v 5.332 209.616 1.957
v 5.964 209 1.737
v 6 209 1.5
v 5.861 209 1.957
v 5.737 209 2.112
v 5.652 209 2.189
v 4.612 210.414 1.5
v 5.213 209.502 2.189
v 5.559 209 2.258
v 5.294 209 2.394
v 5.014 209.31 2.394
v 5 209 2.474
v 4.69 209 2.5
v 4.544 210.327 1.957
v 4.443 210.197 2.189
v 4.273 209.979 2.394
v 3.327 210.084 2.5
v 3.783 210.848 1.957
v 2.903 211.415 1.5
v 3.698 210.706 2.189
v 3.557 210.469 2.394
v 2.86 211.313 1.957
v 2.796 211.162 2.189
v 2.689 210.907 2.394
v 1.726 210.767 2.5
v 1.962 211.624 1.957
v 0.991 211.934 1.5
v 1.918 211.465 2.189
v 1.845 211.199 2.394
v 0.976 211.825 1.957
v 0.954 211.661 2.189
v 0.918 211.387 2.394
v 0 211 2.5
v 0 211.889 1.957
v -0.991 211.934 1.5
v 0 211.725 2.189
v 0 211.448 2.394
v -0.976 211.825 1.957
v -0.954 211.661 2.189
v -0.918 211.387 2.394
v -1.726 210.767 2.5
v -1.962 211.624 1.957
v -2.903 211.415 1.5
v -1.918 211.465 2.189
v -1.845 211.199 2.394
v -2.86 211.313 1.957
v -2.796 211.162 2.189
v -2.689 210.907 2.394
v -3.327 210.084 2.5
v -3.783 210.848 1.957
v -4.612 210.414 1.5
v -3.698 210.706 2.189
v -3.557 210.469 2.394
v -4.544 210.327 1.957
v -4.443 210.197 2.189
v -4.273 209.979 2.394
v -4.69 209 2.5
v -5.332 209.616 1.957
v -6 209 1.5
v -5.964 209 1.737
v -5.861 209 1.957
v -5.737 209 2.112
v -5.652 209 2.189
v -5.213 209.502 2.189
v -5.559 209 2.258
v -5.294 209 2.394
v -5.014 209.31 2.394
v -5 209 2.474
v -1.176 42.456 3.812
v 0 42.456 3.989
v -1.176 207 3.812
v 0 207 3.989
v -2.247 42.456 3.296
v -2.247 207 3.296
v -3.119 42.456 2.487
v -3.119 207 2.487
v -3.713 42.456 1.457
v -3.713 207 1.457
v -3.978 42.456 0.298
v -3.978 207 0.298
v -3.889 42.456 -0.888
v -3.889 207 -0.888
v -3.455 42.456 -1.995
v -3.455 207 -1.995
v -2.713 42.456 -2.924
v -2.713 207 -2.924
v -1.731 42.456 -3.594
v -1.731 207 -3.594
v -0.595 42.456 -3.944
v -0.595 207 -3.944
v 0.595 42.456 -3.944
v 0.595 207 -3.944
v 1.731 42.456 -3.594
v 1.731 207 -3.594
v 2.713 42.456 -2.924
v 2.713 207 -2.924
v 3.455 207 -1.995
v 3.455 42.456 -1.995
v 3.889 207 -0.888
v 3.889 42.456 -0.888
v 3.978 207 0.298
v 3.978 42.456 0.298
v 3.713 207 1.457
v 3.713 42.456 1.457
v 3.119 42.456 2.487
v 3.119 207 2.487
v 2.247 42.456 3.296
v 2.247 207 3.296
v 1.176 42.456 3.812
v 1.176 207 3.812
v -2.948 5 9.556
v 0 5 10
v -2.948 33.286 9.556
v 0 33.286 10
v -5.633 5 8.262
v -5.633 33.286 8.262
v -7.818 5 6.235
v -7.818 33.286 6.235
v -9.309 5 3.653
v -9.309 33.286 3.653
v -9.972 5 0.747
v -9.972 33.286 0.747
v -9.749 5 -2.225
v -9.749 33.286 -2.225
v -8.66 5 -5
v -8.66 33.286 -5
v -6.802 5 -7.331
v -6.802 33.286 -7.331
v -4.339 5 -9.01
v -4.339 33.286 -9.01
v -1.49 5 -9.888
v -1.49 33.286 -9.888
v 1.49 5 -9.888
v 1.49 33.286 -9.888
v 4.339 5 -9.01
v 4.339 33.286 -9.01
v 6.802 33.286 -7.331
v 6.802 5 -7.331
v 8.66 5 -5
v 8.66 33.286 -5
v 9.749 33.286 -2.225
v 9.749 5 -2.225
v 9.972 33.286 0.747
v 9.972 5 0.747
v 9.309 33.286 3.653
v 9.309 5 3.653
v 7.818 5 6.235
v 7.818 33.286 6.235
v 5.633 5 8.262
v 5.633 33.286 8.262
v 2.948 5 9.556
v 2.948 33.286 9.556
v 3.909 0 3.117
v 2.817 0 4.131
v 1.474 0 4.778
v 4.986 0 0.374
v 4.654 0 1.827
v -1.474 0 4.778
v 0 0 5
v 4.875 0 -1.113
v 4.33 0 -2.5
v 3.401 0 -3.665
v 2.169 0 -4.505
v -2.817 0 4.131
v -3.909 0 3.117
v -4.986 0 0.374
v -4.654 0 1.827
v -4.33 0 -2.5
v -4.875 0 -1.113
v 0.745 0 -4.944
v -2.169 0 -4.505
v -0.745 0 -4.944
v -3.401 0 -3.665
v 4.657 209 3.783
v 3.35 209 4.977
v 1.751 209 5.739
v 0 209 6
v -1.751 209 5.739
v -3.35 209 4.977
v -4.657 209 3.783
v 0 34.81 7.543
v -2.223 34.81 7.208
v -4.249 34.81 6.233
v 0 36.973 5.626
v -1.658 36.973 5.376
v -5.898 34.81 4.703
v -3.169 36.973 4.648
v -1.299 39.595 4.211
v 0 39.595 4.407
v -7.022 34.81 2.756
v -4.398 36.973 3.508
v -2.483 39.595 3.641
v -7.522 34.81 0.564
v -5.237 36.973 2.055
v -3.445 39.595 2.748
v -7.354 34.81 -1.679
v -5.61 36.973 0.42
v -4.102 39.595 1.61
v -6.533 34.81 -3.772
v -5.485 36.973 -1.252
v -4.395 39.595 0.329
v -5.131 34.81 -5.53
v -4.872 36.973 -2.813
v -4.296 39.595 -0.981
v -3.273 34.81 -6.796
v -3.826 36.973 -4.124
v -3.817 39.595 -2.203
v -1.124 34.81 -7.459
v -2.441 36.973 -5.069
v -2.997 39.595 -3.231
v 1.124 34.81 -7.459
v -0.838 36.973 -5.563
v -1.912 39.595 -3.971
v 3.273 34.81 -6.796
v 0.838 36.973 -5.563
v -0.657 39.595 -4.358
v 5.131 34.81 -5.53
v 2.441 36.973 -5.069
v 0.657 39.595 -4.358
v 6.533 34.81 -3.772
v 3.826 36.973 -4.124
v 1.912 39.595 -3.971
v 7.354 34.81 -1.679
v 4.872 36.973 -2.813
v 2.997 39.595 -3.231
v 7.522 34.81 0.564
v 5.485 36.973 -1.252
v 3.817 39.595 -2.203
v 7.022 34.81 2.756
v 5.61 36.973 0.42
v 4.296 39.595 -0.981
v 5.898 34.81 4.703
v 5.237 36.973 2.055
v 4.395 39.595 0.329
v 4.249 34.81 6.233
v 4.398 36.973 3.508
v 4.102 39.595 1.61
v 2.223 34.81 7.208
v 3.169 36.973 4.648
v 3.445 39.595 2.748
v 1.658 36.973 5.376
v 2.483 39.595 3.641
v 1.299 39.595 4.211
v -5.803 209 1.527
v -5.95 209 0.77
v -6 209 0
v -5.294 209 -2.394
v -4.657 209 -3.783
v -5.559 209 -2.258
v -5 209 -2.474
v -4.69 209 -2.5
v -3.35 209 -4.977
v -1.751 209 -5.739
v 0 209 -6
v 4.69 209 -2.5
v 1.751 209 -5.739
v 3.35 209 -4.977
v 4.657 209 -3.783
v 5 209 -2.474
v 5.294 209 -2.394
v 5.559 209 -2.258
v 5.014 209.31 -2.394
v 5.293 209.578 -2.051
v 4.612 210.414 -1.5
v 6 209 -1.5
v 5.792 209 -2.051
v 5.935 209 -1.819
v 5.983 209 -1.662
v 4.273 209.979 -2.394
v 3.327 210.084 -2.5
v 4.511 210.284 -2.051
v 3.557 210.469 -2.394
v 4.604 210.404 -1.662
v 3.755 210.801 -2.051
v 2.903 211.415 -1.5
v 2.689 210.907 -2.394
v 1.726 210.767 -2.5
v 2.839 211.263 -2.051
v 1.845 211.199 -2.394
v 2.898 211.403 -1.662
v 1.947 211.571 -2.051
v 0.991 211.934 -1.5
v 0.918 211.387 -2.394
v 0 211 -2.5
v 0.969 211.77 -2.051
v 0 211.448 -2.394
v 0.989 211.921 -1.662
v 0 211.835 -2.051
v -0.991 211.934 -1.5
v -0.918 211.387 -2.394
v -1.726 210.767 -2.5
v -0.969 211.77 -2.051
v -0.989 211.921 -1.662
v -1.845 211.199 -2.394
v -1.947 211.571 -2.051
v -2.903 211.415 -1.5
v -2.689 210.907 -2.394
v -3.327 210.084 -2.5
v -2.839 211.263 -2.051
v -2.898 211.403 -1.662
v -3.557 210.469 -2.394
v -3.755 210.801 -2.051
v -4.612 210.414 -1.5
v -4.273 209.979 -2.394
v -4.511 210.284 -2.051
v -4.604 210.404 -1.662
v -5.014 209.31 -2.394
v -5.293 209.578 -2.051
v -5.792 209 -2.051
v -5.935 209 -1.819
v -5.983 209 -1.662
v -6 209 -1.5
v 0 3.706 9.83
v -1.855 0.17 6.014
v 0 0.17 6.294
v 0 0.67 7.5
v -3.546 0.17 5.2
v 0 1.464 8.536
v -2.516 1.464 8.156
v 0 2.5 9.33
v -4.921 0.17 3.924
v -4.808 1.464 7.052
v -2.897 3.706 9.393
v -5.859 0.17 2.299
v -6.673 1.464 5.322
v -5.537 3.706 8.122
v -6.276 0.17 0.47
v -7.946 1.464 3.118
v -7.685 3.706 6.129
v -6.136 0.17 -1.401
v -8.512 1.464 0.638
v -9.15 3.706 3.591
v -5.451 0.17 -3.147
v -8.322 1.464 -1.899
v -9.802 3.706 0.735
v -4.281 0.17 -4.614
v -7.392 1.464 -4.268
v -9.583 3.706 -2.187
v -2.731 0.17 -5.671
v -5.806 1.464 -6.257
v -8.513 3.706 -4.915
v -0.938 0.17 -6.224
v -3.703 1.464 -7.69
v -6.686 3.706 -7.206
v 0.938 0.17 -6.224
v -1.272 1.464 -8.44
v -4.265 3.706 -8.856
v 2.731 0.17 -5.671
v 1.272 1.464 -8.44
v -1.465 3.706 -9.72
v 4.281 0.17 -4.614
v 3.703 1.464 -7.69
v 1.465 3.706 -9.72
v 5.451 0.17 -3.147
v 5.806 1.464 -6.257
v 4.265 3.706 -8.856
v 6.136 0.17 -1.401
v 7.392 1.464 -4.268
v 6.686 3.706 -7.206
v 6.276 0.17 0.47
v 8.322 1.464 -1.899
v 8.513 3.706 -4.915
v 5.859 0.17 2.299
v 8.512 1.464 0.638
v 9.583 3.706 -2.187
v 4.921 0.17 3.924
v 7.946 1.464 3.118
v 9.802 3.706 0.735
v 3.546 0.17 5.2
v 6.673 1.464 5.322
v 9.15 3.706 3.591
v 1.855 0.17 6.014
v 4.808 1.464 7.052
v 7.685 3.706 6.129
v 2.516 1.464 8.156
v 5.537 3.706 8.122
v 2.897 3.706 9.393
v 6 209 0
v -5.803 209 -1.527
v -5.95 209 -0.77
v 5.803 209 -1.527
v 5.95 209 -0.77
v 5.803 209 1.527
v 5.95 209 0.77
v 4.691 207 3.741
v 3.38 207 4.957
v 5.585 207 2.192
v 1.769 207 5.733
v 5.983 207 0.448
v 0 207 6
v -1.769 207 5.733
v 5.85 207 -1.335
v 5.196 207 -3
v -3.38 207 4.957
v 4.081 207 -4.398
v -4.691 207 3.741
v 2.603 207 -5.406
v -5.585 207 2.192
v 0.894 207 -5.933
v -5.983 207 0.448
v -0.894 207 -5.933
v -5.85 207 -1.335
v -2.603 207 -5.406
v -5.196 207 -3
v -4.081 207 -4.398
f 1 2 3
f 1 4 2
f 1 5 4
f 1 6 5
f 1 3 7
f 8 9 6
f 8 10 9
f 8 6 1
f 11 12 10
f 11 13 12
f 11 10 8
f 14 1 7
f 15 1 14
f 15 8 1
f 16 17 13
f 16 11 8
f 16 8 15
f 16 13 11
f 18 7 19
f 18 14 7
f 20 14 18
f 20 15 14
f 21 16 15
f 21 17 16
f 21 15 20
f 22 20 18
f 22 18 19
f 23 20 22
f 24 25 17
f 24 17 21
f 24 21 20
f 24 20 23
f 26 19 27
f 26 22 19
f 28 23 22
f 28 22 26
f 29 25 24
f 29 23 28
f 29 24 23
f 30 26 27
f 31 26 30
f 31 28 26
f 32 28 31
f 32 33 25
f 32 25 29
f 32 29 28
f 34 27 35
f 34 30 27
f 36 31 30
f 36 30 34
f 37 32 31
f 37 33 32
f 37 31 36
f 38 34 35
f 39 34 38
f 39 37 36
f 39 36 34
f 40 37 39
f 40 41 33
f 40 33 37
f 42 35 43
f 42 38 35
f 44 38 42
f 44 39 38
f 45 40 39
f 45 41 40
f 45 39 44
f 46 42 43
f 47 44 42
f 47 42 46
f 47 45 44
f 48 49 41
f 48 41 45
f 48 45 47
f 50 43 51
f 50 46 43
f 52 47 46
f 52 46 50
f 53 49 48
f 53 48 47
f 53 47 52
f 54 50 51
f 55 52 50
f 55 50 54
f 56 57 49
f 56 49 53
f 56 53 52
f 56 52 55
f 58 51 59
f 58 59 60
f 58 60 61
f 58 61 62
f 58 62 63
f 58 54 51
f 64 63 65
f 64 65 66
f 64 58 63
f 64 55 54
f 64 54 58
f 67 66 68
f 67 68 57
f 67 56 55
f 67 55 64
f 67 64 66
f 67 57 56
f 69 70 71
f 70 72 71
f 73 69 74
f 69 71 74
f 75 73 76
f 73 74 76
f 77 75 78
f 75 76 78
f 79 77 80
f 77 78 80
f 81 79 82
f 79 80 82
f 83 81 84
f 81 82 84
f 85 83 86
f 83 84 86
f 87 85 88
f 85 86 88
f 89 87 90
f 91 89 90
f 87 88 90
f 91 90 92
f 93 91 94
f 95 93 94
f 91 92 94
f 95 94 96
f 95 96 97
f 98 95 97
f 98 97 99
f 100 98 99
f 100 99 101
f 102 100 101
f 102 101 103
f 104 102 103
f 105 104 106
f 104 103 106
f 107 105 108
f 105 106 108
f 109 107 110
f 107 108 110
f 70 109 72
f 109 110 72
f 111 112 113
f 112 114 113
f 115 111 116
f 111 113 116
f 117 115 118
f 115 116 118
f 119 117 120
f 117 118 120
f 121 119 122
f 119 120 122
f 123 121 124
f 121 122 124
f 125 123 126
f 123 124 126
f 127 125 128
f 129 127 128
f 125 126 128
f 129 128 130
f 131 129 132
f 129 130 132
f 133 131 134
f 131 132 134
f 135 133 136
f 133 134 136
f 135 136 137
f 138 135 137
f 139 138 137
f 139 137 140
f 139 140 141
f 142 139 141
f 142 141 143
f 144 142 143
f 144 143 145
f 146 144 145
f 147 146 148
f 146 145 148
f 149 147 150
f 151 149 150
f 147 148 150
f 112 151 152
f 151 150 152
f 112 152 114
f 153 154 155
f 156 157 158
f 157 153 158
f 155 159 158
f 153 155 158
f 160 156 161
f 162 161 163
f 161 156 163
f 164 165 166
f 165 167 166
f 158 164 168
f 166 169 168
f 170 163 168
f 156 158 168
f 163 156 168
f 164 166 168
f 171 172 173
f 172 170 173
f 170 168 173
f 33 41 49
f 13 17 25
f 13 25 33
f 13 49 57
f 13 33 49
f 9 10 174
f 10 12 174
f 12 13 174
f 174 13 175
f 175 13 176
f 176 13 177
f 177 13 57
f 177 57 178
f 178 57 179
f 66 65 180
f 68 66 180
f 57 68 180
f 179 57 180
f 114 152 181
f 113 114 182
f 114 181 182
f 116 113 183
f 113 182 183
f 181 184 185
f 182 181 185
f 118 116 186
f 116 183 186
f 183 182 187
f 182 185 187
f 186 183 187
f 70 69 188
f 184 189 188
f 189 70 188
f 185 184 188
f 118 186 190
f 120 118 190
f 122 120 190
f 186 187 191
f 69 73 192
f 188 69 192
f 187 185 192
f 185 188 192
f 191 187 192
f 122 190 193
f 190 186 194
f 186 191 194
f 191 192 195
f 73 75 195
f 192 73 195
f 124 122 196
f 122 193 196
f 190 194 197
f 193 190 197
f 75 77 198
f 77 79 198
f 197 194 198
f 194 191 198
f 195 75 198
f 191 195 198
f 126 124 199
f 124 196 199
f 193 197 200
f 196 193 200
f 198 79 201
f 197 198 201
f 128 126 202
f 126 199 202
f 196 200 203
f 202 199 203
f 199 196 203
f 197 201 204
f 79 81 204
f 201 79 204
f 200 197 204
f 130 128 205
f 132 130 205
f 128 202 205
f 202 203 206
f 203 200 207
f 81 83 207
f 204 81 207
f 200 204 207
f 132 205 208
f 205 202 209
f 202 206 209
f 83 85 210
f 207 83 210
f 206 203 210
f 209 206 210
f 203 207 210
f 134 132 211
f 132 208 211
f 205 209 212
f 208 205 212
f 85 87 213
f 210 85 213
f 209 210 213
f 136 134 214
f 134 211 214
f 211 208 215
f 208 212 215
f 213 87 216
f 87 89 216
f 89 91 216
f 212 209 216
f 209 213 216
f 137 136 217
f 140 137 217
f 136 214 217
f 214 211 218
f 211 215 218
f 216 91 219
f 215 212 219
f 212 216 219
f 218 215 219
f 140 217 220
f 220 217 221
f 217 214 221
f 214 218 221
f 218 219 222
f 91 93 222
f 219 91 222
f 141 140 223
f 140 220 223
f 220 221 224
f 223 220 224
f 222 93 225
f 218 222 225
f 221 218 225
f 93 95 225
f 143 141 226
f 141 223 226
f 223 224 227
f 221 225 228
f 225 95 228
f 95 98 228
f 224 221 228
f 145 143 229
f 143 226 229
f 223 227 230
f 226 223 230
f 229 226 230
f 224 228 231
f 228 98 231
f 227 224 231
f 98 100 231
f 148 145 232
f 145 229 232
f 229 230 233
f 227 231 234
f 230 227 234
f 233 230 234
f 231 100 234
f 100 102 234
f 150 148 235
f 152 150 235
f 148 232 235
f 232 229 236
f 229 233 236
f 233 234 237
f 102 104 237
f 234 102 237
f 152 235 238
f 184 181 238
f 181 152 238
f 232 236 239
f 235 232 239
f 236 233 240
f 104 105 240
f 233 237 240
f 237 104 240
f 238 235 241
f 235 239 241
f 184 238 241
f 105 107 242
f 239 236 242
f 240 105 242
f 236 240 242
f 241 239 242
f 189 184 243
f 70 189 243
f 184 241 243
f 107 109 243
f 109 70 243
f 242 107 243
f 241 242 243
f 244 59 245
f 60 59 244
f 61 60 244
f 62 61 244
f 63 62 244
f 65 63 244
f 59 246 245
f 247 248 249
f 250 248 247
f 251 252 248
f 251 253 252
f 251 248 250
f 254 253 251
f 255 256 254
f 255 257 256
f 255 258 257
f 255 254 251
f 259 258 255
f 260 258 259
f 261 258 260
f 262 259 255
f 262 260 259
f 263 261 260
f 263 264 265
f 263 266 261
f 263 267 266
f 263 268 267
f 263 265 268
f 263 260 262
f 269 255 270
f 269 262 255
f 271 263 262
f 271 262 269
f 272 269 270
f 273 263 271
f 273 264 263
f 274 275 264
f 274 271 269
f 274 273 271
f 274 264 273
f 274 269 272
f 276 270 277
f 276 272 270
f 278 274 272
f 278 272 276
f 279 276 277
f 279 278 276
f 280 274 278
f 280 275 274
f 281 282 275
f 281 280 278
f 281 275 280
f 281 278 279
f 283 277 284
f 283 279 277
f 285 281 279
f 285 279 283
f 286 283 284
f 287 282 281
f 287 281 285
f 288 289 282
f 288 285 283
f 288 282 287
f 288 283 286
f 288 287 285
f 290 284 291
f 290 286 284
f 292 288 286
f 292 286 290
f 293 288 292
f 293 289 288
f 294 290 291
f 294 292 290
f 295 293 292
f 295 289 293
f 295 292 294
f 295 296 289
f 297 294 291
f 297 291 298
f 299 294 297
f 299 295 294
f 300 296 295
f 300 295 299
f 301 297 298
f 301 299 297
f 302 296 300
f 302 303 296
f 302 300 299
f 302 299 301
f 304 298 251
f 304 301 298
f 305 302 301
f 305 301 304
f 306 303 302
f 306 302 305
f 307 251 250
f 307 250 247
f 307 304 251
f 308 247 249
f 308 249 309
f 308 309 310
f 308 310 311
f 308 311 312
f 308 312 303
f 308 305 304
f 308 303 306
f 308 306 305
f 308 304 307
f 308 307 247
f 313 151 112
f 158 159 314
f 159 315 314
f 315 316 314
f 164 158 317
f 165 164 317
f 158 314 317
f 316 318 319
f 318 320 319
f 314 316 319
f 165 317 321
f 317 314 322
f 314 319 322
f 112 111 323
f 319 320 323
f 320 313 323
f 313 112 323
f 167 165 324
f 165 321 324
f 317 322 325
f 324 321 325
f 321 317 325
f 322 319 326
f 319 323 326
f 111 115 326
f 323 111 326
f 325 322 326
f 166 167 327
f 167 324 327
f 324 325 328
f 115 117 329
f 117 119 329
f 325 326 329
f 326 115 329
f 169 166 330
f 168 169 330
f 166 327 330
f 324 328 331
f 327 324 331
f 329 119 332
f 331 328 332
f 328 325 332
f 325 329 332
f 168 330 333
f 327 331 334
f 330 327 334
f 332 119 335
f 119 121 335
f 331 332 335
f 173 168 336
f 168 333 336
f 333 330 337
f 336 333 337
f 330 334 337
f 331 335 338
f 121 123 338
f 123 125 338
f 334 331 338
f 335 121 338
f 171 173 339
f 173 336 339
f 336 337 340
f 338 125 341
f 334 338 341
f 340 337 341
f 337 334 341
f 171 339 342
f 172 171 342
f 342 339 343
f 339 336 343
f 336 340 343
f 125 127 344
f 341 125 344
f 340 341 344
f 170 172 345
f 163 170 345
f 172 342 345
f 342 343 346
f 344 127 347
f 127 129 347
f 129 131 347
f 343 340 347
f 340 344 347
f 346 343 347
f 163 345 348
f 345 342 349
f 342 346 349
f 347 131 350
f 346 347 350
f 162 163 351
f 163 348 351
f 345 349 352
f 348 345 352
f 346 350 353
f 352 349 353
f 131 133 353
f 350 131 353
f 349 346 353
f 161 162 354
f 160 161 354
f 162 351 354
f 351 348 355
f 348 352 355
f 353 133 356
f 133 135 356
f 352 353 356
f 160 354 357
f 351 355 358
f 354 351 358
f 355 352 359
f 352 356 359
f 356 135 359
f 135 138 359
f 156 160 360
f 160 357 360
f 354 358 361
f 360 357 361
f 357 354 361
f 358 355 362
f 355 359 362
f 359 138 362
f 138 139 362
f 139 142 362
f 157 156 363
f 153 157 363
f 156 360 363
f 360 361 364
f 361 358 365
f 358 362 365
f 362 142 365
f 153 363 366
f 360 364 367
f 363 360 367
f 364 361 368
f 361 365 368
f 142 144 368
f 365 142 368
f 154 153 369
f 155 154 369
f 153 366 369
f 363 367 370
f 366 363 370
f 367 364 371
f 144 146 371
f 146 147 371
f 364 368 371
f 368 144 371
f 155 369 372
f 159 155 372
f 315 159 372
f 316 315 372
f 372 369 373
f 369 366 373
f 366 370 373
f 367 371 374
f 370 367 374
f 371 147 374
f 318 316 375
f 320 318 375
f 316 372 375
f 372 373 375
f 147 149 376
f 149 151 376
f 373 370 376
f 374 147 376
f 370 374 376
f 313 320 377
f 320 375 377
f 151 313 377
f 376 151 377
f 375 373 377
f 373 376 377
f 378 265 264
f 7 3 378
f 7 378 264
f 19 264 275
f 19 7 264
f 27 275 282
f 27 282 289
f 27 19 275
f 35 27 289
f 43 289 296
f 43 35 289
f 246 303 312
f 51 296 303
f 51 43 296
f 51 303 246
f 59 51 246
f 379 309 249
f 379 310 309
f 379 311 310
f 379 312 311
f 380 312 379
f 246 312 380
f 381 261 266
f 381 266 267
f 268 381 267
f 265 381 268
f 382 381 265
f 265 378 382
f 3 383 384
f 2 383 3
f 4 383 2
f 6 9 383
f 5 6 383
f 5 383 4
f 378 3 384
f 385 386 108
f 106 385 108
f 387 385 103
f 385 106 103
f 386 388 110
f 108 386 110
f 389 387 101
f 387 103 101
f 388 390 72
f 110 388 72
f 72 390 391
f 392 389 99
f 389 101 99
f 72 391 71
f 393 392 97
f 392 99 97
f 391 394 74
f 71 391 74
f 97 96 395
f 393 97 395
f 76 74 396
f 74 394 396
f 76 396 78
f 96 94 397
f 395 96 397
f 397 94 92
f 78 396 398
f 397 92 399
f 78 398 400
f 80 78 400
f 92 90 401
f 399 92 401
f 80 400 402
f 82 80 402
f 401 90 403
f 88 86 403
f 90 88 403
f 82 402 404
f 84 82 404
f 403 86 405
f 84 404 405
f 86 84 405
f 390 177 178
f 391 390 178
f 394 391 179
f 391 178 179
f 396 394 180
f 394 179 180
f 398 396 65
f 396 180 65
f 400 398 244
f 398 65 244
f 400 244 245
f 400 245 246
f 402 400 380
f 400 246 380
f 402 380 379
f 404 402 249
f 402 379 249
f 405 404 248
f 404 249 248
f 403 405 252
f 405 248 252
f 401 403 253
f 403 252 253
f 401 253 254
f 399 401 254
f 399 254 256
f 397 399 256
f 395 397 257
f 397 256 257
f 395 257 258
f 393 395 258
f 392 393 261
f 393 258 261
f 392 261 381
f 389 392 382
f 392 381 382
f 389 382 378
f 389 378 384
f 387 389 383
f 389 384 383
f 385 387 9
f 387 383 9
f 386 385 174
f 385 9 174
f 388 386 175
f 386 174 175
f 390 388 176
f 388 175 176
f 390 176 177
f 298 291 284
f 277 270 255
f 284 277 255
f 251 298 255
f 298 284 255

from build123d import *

# Parameters (mm, degrees)
BOSS_EXTRUDE1_DEPTH = 2.5
FILLET1_R           = 1


with BuildPart() as part:
    # Sketch1 → Revolve1 (revolve)
    with BuildSketch(Plane.XY, mode=Mode.PRIVATE) as revolve1_sk:
        with BuildLine():
            Line((0, 0), (5, 0))
            ThreePointArc((5, 0), (8.535533906, 1.464466094), (10, 5))
            Line((10, 5), (10, 33.285700302))
            ThreePointArc((10, 33.285700302), (5.625709026, 36.973401218), (3.989031047, 42.455631126))
            Line((3.989031047, 42.455631126), (3.989031047, 207))
            Line((3.989031047, 207), (6, 207))
            Line((6, 207), (6, 209))
            Line((6, 209), (0, 209))
            Line((0, 209), (0, 0))
        make_face()
    revolve(revolve1_sk.sketch.rotate(Axis((0, 0, 0), (0, -1, 0)), 90), axis=Axis((0, 0, 0), (0, -1, 0)))

    # Sketch2 → Boss-Extrude1 (add, symmetric)
    with BuildSketch(Plane.XY):
        with BuildLine():
            Line((-6, 209), (6, 209))
            ThreePointArc((6, 209), (0, 212), (-6, 209))
        make_face()
    extrude(amount=BOSS_EXTRUDE1_DEPTH, both=True)

    # Fillet1
    # the kernel refuses this fillet: 1 mm, written as the material it takes off along each edge
    with BuildSketch(Plane(origin=(0, 204.5, -2.5), x_dir=(0.9523393361832132, 0.3050406346015508, 0), z_dir=(0.3050406346015508, -0.9523393361832132, 0))) as fillet1_piece_1_section:
        with BuildLine():
            CenterArc((7.5 - FILLET1_R, FILLET1_R), FILLET1_R, 270, 90)
            Line((7.5 - FILLET1_R, 0), (7.5, 0))
            Line((7.5, 0), (7.5, FILLET1_R))
        make_face()
    fillet1_piece_1 = revolve(axis=Axis((0, 204.5, -2.5), (0, 0, 1)), revolution_arc=144.478782805, mode=Mode.PRIVATE)
    fillet1_piece_1 = split(fillet1_piece_1, bisect_by=Plane(origin=(5.716310171, 209, -2.240967586), z_dir=(0, 1, 0)), keep=Keep.TOP, mode=Mode.PRIVATE)
    add(fillet1_piece_1, mode=Mode.SUBTRACT)
    with BuildSketch(Plane(origin=(0, 204.5, 2.5), x_dir=(0.9523393361832132, 0.3050406346015508, 0), z_dir=(0.3050406346015508, -0.9523393361832132, 0))) as fillet1_piece_2_section:
        with BuildLine():
            CenterArc((7.5 - FILLET1_R, -FILLET1_R), FILLET1_R, 0, 90)
            Line((7.5, -FILLET1_R), (7.5, 0))
            Line((7.5, 0), (7.5 - FILLET1_R, 0))
        make_face()
    fillet1_piece_2 = revolve(axis=Axis((0, 204.5, 2.5), (0, 0, 1)), revolution_arc=144.478782805, mode=Mode.PRIVATE)
    fillet1_piece_2 = split(fillet1_piece_2, bisect_by=Plane(origin=(5.71631017, 209, 2.240967722), z_dir=(0, 1, 0)), keep=Keep.TOP, mode=Mode.PRIVATE)
    add(fillet1_piece_2, mode=Mode.SUBTRACT)


solid = part.part
